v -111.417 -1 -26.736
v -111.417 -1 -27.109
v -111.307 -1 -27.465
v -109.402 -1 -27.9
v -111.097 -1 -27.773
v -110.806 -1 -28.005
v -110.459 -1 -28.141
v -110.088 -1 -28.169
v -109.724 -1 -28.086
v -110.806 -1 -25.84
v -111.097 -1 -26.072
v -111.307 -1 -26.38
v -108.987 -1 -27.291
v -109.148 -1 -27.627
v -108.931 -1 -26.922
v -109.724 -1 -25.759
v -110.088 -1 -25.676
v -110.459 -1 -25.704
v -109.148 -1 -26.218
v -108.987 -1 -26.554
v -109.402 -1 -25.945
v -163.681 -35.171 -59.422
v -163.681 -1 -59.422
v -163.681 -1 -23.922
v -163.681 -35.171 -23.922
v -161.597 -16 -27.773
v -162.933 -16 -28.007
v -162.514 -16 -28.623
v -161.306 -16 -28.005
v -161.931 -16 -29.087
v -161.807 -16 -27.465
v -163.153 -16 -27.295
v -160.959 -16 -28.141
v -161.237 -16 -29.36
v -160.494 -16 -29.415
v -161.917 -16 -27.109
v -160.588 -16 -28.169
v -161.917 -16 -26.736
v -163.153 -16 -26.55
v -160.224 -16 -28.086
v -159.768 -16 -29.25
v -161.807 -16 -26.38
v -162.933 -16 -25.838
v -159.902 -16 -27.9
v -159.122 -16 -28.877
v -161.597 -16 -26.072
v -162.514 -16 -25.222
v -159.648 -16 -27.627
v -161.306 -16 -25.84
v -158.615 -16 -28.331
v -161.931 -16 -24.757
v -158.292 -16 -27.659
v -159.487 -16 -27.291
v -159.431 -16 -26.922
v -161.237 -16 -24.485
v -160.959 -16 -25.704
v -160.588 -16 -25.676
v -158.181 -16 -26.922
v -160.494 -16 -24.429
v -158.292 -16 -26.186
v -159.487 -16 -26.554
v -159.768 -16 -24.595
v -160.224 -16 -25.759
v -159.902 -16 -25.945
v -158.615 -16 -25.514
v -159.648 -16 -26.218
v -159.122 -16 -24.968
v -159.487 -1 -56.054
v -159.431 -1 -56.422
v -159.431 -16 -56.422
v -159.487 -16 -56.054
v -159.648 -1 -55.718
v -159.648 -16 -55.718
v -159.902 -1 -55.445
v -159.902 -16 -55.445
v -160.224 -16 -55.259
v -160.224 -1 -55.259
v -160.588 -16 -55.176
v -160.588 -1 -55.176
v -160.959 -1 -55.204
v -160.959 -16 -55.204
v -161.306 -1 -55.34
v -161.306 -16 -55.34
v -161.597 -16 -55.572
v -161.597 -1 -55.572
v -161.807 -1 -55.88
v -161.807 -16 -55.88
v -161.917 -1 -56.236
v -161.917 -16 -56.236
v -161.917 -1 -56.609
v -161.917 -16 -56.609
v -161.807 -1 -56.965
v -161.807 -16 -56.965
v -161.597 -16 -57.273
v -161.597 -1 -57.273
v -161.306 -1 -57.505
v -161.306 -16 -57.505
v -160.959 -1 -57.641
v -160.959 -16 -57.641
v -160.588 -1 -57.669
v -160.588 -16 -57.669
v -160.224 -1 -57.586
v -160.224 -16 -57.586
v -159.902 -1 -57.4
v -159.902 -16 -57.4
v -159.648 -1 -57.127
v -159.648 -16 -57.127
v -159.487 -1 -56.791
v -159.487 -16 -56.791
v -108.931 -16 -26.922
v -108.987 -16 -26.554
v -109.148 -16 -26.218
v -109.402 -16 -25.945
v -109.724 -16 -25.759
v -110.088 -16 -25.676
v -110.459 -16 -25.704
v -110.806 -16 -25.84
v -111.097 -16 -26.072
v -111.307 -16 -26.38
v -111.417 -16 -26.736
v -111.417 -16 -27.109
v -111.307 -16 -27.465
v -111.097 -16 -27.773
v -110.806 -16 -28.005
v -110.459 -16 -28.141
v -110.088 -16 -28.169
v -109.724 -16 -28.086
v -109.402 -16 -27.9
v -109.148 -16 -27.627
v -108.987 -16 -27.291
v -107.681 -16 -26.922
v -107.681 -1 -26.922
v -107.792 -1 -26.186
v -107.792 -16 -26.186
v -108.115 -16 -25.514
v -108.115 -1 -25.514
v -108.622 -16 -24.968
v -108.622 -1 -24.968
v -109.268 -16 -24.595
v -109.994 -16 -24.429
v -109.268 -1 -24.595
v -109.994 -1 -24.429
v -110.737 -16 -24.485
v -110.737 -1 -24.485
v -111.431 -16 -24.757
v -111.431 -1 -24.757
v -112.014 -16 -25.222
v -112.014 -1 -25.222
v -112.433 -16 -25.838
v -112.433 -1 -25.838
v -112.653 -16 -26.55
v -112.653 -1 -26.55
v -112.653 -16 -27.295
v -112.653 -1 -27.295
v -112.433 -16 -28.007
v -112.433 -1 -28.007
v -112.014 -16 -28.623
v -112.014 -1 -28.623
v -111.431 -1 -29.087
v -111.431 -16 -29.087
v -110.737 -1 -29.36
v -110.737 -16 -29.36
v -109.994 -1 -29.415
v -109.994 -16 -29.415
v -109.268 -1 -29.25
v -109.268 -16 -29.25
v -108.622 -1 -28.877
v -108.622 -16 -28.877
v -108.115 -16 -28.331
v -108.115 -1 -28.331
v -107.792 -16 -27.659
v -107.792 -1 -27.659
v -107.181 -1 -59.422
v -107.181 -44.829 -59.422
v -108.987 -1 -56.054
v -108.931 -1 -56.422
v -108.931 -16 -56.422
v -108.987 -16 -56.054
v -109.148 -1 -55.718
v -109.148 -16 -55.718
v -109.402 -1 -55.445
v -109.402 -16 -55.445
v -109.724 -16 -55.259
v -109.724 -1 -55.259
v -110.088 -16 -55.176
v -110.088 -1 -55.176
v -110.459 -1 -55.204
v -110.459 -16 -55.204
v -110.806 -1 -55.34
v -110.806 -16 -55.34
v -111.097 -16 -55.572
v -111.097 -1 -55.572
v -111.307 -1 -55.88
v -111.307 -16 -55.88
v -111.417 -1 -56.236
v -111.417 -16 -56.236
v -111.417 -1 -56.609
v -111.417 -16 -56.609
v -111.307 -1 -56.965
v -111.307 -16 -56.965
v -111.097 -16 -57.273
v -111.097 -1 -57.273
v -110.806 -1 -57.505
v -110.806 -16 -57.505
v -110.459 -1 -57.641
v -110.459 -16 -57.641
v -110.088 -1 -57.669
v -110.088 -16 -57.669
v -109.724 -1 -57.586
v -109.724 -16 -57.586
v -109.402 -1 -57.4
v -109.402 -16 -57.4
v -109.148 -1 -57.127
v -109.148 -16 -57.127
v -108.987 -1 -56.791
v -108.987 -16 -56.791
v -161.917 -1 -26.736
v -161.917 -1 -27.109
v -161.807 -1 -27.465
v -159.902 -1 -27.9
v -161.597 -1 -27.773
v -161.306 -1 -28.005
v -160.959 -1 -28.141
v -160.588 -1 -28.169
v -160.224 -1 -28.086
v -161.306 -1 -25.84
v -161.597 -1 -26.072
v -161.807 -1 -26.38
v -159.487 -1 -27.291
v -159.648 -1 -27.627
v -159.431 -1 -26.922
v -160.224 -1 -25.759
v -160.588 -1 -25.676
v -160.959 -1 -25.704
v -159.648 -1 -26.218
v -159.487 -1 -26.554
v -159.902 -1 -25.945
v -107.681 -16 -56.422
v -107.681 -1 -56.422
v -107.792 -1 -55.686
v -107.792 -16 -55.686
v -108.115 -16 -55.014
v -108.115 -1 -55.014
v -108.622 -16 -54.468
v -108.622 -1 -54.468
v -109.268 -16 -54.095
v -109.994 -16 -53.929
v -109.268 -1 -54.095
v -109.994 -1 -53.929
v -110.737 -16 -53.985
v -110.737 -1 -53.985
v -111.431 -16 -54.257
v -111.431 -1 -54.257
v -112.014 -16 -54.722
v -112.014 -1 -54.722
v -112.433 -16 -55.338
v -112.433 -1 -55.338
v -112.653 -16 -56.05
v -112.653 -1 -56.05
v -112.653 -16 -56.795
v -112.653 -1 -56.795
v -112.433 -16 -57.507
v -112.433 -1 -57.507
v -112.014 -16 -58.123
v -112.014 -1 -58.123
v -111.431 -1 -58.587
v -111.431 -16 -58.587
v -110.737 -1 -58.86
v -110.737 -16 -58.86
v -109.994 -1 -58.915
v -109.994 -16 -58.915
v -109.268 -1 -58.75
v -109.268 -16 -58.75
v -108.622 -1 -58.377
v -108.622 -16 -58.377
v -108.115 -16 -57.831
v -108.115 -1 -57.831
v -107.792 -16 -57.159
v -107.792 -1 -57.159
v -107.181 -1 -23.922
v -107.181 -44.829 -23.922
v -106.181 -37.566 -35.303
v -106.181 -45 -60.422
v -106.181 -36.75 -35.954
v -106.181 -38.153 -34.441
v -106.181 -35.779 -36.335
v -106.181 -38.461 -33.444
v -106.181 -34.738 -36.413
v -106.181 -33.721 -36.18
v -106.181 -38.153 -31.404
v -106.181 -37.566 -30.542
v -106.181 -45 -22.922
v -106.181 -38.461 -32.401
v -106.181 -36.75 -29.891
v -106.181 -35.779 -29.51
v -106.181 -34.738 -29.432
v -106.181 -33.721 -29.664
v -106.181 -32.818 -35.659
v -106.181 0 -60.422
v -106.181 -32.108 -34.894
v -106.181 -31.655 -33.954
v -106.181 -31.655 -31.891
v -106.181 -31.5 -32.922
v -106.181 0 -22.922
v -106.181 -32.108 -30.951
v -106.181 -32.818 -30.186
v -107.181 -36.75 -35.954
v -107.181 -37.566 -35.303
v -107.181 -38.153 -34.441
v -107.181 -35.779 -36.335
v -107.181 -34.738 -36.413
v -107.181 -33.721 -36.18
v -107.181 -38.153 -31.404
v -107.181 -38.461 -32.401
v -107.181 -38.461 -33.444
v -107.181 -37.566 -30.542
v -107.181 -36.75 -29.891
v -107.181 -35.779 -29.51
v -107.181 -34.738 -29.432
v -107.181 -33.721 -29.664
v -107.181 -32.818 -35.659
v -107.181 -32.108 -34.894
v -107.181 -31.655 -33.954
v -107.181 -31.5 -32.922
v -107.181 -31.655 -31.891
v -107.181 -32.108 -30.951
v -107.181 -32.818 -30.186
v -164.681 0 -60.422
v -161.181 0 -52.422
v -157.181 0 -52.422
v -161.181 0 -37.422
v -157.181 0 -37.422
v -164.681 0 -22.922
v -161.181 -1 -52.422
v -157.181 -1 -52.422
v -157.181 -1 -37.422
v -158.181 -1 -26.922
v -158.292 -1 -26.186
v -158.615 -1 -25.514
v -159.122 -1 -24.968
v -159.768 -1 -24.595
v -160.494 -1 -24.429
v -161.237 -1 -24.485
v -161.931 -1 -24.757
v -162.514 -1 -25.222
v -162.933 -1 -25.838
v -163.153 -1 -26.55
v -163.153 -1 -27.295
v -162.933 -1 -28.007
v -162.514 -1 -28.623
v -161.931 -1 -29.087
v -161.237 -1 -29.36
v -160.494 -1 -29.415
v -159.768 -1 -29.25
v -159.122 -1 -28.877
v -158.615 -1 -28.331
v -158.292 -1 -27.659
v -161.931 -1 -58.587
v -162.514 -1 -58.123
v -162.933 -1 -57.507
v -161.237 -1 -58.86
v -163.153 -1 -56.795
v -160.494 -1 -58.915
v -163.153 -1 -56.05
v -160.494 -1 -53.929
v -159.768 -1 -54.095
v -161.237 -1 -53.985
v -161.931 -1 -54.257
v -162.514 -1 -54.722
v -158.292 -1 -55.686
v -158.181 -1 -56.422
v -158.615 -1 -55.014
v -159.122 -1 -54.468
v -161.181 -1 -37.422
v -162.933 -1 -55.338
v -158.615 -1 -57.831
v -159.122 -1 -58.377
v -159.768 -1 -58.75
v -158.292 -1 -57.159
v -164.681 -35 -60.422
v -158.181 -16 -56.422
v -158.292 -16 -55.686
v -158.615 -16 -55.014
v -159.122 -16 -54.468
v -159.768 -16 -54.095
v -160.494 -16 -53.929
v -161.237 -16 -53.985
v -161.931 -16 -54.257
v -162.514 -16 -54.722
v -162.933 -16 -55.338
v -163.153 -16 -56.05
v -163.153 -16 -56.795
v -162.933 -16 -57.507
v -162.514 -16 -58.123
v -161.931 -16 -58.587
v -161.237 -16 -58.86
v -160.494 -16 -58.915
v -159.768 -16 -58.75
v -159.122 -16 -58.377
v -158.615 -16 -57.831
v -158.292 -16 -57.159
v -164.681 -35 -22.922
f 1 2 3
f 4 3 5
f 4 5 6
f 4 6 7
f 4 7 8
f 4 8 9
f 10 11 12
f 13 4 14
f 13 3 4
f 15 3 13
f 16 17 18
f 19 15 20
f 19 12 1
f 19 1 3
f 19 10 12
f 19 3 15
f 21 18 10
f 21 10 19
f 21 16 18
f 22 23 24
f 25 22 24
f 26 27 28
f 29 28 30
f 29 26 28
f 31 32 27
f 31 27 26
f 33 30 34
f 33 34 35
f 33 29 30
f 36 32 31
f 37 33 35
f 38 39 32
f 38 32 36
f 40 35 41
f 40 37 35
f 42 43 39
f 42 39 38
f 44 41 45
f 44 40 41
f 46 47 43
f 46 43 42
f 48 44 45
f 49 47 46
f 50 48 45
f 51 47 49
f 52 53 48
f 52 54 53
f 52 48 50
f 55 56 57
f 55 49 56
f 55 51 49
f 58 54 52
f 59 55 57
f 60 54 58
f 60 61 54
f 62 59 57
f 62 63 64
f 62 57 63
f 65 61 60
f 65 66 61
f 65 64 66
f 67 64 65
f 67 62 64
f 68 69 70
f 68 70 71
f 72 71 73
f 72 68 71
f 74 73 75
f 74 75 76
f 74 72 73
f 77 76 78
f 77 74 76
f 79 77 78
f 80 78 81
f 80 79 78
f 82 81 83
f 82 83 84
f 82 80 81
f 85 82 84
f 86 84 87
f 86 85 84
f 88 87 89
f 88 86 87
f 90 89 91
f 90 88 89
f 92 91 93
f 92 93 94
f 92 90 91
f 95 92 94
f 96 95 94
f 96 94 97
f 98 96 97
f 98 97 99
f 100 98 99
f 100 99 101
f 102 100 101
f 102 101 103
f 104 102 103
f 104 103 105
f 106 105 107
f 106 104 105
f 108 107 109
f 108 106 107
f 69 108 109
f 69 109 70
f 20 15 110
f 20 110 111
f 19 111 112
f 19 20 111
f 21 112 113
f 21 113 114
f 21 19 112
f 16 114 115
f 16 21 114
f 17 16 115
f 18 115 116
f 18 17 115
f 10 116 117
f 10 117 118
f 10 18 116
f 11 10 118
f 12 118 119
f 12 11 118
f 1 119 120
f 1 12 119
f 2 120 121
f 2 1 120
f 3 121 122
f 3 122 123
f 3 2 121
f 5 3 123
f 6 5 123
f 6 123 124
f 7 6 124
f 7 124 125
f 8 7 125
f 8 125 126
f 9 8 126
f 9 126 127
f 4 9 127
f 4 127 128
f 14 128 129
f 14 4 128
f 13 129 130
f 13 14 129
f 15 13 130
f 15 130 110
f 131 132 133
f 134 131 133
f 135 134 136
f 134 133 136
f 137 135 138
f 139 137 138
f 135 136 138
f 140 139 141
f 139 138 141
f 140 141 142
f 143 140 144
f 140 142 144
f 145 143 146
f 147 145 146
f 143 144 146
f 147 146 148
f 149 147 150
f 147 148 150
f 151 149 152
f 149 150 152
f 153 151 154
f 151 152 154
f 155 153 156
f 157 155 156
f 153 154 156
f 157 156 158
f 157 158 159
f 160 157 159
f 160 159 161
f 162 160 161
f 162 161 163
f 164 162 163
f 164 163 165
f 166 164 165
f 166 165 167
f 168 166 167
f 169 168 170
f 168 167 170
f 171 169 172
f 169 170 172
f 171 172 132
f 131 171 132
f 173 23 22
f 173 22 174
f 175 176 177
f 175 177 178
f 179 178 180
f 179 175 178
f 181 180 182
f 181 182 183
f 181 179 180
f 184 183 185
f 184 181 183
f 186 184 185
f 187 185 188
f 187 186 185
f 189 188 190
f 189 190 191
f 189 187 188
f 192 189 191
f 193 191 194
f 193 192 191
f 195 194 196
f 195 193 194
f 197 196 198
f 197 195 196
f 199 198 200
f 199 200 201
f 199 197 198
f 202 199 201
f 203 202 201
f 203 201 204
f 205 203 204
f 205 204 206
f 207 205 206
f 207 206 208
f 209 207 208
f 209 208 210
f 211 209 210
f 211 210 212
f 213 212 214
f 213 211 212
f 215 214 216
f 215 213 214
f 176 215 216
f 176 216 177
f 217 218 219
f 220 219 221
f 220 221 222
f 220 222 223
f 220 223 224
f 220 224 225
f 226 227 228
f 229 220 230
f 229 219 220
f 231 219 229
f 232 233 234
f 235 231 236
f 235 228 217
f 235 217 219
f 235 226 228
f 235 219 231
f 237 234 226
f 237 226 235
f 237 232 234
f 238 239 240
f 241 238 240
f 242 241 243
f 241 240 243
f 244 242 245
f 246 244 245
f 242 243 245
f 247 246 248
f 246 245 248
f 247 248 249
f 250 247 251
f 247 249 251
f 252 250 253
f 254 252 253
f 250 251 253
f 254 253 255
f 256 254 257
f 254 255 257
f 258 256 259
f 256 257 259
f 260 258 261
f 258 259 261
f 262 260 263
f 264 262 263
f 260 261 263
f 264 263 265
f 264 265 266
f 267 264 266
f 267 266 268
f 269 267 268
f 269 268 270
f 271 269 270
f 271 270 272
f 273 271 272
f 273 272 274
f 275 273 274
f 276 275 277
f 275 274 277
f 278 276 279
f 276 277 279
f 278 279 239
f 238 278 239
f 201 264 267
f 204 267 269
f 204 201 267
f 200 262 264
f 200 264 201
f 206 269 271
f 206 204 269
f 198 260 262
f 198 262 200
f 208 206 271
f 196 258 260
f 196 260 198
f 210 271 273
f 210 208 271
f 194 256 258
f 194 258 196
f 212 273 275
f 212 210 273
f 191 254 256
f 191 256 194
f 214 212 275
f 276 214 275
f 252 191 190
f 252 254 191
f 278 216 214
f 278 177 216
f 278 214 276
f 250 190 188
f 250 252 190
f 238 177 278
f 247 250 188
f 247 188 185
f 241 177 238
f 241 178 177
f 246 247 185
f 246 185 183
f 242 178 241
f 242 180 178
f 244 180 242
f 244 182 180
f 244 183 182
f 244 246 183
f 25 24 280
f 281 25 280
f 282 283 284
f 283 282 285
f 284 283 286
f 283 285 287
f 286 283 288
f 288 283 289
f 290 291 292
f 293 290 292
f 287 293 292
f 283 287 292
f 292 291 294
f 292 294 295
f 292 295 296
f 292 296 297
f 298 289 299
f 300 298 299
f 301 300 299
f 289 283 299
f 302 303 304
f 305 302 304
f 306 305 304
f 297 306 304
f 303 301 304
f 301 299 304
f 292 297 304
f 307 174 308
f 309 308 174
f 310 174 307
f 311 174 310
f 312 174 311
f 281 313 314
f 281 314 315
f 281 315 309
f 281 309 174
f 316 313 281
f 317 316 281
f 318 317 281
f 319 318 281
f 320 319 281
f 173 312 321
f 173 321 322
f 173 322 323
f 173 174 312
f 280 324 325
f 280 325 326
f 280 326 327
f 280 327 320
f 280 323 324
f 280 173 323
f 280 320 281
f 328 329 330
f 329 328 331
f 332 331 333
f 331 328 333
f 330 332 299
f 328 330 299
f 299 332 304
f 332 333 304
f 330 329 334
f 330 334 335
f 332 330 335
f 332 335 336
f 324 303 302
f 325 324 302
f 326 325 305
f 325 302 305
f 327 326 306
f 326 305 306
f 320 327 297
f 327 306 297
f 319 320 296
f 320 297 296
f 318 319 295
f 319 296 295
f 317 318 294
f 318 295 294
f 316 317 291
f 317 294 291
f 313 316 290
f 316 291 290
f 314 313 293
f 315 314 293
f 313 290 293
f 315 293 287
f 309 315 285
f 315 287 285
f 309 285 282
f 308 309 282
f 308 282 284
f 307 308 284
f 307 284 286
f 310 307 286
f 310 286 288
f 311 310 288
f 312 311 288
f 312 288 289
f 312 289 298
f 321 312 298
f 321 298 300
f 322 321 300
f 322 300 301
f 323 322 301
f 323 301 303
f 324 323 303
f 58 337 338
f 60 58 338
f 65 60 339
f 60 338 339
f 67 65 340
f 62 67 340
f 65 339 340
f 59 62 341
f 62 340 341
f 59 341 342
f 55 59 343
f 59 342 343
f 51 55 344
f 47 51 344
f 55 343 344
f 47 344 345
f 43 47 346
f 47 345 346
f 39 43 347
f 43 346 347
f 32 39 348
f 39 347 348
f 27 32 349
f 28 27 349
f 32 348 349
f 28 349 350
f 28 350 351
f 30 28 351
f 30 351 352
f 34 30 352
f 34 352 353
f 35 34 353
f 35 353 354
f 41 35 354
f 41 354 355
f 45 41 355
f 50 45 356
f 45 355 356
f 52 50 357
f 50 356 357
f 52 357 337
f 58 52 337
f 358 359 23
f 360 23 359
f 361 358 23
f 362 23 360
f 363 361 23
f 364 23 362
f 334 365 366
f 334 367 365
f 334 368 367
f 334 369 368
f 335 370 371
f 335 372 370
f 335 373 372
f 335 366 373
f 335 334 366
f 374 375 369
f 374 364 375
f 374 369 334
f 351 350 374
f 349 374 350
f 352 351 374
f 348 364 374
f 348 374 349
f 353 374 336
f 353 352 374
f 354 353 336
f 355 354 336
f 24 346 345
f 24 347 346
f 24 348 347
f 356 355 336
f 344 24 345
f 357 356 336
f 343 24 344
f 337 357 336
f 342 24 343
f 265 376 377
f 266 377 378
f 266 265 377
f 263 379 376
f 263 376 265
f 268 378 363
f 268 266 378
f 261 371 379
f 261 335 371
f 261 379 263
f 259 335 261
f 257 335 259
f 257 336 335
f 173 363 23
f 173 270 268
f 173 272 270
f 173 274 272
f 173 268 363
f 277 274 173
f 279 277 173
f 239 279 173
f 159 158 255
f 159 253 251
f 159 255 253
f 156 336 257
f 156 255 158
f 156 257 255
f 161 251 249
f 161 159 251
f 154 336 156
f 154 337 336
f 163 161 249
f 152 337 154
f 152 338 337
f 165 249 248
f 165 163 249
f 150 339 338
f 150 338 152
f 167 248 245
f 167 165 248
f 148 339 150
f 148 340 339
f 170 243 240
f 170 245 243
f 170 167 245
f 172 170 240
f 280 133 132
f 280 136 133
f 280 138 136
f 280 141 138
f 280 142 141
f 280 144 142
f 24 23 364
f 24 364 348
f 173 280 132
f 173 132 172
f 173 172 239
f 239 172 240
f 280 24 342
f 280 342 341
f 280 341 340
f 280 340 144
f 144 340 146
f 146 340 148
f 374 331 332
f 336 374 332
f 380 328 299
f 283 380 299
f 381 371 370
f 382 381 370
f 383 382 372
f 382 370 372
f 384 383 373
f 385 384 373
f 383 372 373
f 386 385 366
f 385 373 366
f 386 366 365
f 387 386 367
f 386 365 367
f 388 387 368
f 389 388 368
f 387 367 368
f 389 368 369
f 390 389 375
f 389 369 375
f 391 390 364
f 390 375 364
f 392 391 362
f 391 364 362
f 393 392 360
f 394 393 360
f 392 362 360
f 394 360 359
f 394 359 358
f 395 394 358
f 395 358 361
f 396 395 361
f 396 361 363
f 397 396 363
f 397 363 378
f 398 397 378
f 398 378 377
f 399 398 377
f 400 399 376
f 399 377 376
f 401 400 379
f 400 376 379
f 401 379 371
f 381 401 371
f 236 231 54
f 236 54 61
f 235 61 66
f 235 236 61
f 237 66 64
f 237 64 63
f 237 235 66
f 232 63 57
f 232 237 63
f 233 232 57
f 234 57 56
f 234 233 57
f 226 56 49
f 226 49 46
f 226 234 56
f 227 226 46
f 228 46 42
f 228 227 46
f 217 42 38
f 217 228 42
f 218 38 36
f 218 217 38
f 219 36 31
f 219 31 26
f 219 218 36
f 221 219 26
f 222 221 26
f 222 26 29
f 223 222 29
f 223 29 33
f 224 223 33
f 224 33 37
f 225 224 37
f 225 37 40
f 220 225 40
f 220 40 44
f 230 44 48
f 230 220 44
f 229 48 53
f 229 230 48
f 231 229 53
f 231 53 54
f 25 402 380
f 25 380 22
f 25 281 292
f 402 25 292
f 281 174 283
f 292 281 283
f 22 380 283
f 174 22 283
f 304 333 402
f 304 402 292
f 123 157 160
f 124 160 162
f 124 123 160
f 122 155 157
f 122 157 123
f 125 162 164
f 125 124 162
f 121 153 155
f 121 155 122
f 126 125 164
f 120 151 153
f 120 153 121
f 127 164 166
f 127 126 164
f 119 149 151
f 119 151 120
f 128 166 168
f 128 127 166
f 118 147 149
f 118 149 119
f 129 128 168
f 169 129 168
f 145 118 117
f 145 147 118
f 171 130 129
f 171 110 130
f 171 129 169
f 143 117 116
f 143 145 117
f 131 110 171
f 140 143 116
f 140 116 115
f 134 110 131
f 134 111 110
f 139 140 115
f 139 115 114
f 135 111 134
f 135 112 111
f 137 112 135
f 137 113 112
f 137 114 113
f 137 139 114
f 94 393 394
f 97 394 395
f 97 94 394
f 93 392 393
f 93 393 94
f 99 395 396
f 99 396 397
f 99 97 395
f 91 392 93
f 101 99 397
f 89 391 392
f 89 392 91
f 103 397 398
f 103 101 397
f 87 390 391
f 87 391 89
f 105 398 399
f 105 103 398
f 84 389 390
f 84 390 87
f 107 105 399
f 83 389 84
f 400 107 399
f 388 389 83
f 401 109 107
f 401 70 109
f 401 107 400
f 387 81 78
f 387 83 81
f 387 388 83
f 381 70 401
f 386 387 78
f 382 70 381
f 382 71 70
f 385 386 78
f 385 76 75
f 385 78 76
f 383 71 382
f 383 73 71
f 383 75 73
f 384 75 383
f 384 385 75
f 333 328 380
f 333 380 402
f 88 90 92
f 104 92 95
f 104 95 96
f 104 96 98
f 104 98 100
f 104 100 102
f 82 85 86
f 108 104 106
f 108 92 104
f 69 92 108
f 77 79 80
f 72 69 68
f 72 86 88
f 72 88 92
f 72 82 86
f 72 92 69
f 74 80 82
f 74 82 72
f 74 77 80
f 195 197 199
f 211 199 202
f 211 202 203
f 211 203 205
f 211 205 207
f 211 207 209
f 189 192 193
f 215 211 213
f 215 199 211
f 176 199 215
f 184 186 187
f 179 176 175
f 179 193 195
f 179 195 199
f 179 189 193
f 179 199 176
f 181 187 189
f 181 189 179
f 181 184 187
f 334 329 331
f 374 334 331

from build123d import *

# Parameters (mm, degrees)
F0_W     = 58.5
F0_H     = 37.5
F0_W_2   = 4
F0_H_2   = 15
F1_DEPTH = 45
F2_T     = -1
F4_DEPTH = 52.9
F5_R     = 3.5
F6_DEPTH = 25
F7_DEPTH = 25
F8_R     = 2.5
F8_R_2   = 1.25
F9_DEPTH = 15


# Not quite as in the source:
# - a feature names something its author has since deleted; it is built from what else it names


with BuildPart() as f1:
    # F0 (on Front) → F1 (new body)
    with BuildSketch(Plane.XZ):
        with Locations((-135.4310402274, -41.6724174619)):
            Rectangle(F0_W, F0_H)
        with Locations((-159.1810402274, -44.9224174619)):
            Rectangle(F0_W_2, F0_H_2, mode=Mode.SUBTRACT)
        with Locations((-159.1810402274, -44.9224174619)):
            Rectangle(F0_W_2, F0_H_2)
    extrude(amount=F1_DEPTH)

    # F2
    f2_openings = [f1.faces().sort_by_distance(p)[0] for p in [
        (-135.43104, -45, -41.672417),
    ]]
    offset(amount=F2_T, openings=f2_openings)

    # F3 (on face) → F4 (cut)
    with BuildSketch(Plane(origin=(0, 0, -60.4224174619), x_dir=(1, 0, 0), z_dir=(0, 0, -1))):
        Polygon((-164.6810402274, 45), (-164.6810402274, 35), (-106.1810402274, 45), align=None)
    extrude(amount=-F4_DEPTH, mode=Mode.SUBTRACT)

    # F5 (on face) → F6 (cut)
    with BuildSketch(Plane.YZ.offset(-106.1810402274)):
        with Locations((-35, -32.9224174619)):
            Circle(F5_R)
    extrude(amount=-F6_DEPTH, mode=Mode.SUBTRACT)

    # F0 (on Front) → F7 (cut)
    with BuildSketch(Plane.XZ):
        with Locations((-159.1810402274, -44.9224174619)):
            Rectangle(F0_W_2, F0_H_2)
    extrude(amount=F7_DEPTH, mode=Mode.SUBTRACT)

    # F8 (on face) → F9 (join)
    with BuildSketch(Plane.XZ.offset(1)):
        with Locations((-110.1810402274, -26.9224174619)):
            Circle(F8_R)
        with Locations((-110.1810402274, -26.9224174619)):
            Circle(F8_R_2, mode=Mode.SUBTRACT)
        with Locations((-110.1810402274, -56.4224174619)):
            Circle(F8_R)
        with Locations((-110.1810402274, -56.4224174619)):
            Circle(F8_R_2, mode=Mode.SUBTRACT)
        with Locations((-160.6810402274, -56.4224174619)):
            Circle(F8_R)
        with Locations((-160.6810402274, -56.4224174619)):
            Circle(F8_R_2, mode=Mode.SUBTRACT)
        with Locations((-160.6810402274, -26.9224174619)):
            Circle(F8_R)
        with Locations((-160.6810402274, -26.9224174619)):
            Circle(F8_R_2, mode=Mode.SUBTRACT)
    extrude(amount=F9_DEPTH)


solid = f1.part
